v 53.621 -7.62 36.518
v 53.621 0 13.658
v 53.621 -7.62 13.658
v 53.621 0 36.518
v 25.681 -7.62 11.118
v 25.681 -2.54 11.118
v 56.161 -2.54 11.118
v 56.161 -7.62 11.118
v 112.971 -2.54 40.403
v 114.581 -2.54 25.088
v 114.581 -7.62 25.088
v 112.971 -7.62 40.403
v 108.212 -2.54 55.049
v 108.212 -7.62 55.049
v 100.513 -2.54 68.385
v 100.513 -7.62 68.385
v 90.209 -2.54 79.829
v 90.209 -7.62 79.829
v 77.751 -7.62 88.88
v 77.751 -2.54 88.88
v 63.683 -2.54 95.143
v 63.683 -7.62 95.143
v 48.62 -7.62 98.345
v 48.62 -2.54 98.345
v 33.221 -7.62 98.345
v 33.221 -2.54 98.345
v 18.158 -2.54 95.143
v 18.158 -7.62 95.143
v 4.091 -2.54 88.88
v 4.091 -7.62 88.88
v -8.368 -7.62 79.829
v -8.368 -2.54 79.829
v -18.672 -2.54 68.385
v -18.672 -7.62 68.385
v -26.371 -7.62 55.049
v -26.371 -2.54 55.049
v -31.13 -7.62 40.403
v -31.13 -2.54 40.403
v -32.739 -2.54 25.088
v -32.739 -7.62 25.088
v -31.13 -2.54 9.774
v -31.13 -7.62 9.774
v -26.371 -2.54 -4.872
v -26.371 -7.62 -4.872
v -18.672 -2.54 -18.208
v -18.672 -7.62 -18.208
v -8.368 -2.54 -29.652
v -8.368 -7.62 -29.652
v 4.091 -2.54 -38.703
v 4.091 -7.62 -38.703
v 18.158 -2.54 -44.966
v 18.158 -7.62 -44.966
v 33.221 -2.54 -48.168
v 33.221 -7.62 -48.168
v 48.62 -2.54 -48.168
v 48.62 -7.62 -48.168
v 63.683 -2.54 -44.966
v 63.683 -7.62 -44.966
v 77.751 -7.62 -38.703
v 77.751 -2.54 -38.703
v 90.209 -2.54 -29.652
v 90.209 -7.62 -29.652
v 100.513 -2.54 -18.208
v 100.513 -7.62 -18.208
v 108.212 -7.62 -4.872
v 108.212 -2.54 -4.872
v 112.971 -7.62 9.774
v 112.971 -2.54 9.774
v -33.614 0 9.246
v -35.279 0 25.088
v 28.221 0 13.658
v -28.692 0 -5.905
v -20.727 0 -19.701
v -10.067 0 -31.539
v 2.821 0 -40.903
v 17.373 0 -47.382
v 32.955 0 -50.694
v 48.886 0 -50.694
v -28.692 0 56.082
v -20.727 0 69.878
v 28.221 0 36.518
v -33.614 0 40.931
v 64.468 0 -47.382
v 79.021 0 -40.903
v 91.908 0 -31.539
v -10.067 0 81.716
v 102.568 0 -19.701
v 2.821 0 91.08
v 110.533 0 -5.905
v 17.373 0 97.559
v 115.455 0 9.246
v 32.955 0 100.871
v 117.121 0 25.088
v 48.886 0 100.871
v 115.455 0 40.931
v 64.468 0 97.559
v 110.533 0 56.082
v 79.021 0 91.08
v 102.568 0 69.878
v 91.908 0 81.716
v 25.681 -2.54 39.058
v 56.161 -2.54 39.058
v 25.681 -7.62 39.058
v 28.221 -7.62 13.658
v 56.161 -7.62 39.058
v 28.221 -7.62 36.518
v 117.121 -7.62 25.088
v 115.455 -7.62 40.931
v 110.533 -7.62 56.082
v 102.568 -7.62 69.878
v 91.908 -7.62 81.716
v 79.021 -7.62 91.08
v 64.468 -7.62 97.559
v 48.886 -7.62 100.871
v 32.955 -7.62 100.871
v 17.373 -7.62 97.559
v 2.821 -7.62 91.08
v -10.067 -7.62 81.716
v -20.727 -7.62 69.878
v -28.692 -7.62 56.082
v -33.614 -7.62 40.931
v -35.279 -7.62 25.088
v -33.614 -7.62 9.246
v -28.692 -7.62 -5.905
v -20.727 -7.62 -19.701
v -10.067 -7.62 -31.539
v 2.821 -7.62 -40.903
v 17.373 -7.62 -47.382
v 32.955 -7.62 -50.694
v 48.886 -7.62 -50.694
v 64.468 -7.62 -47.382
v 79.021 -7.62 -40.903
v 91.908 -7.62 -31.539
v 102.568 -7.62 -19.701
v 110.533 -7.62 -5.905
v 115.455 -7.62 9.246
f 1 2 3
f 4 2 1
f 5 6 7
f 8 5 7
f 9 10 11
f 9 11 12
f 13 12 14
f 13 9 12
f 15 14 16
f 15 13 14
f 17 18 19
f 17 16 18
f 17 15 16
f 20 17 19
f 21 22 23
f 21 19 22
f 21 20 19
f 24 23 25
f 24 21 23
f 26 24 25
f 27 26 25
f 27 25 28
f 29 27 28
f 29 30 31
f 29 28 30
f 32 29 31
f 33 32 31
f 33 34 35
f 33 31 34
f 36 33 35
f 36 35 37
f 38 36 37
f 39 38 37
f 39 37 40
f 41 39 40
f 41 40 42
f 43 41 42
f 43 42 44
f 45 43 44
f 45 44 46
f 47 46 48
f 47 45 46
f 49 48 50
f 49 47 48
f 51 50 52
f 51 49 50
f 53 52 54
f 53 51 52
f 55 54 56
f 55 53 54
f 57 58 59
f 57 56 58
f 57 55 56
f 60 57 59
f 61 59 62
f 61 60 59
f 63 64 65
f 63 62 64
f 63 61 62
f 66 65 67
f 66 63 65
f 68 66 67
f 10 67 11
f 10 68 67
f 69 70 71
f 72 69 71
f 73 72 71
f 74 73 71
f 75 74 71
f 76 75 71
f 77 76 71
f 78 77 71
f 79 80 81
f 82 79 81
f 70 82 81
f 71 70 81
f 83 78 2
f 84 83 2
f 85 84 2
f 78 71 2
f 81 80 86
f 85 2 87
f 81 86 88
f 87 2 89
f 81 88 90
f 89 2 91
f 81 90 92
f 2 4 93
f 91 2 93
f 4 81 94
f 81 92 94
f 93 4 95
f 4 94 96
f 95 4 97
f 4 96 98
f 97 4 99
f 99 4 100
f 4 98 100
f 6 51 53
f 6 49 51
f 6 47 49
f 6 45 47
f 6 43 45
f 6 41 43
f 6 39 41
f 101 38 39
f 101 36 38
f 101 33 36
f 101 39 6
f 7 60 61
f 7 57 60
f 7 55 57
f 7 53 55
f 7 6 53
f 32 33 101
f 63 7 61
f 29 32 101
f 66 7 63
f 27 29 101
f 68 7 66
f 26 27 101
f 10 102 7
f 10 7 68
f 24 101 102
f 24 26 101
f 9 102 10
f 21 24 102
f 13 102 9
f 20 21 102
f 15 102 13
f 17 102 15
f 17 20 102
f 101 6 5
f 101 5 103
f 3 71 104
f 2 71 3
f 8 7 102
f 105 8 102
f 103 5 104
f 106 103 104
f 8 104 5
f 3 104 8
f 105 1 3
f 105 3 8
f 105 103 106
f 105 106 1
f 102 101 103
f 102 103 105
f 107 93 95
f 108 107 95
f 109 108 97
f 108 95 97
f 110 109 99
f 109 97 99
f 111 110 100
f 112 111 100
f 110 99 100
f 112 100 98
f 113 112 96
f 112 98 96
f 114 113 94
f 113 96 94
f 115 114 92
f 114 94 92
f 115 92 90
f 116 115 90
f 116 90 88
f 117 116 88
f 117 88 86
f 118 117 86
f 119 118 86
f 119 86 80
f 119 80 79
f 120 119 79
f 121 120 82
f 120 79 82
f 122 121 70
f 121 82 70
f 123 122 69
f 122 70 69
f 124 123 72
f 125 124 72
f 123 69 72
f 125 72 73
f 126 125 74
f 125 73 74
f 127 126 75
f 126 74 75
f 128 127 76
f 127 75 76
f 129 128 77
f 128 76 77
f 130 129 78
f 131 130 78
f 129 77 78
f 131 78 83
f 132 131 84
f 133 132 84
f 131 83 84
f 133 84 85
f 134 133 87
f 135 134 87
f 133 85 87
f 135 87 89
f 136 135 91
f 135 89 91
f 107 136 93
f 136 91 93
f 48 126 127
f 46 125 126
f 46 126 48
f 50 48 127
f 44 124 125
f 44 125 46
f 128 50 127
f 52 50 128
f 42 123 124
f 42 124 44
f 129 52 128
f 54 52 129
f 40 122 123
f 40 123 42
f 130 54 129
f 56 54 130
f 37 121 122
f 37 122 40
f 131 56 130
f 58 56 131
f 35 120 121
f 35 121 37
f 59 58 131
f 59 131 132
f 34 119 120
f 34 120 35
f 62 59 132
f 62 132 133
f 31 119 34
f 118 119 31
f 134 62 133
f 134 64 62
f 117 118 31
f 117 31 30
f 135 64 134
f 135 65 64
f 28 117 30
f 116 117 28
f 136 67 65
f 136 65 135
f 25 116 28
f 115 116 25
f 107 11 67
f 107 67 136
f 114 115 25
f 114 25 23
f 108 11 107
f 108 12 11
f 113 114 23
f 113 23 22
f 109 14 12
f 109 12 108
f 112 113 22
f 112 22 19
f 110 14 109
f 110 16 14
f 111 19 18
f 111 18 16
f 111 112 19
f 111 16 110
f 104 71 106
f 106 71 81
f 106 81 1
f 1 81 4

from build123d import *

# Parameters (mm, degrees)
F0_R     = 76.2
F0_W     = 25.4
F0_H     = 22.86
F1_DEPTH = 7.62
F3_T     = -2.54


# Not quite as in the source:
# - the program builds the solid bodies; features that only make, move or delete a surface that nothing else refers to are left out


with BuildPart() as f1:
    # F0 (on Front) → F1 (new body)
    with BuildSketch(Plane.XZ):
        with Locations((40.9205045223, 25.0884863067)):
            Circle(F0_R)
        with Locations((40.9205045223, 25.0884863067)):
            Rectangle(F0_W, F0_H, mode=Mode.SUBTRACT)
    extrude(amount=F1_DEPTH)

    # F3
    f3_openings = [f1.faces().sort_by_distance(p)[0] for p in [
        (-33.124234, -7.62, 25.088486),
    ]]
    offset(amount=F3_T, openings=f3_openings, kind=Kind.INTERSECTION)


solid = f1.part
